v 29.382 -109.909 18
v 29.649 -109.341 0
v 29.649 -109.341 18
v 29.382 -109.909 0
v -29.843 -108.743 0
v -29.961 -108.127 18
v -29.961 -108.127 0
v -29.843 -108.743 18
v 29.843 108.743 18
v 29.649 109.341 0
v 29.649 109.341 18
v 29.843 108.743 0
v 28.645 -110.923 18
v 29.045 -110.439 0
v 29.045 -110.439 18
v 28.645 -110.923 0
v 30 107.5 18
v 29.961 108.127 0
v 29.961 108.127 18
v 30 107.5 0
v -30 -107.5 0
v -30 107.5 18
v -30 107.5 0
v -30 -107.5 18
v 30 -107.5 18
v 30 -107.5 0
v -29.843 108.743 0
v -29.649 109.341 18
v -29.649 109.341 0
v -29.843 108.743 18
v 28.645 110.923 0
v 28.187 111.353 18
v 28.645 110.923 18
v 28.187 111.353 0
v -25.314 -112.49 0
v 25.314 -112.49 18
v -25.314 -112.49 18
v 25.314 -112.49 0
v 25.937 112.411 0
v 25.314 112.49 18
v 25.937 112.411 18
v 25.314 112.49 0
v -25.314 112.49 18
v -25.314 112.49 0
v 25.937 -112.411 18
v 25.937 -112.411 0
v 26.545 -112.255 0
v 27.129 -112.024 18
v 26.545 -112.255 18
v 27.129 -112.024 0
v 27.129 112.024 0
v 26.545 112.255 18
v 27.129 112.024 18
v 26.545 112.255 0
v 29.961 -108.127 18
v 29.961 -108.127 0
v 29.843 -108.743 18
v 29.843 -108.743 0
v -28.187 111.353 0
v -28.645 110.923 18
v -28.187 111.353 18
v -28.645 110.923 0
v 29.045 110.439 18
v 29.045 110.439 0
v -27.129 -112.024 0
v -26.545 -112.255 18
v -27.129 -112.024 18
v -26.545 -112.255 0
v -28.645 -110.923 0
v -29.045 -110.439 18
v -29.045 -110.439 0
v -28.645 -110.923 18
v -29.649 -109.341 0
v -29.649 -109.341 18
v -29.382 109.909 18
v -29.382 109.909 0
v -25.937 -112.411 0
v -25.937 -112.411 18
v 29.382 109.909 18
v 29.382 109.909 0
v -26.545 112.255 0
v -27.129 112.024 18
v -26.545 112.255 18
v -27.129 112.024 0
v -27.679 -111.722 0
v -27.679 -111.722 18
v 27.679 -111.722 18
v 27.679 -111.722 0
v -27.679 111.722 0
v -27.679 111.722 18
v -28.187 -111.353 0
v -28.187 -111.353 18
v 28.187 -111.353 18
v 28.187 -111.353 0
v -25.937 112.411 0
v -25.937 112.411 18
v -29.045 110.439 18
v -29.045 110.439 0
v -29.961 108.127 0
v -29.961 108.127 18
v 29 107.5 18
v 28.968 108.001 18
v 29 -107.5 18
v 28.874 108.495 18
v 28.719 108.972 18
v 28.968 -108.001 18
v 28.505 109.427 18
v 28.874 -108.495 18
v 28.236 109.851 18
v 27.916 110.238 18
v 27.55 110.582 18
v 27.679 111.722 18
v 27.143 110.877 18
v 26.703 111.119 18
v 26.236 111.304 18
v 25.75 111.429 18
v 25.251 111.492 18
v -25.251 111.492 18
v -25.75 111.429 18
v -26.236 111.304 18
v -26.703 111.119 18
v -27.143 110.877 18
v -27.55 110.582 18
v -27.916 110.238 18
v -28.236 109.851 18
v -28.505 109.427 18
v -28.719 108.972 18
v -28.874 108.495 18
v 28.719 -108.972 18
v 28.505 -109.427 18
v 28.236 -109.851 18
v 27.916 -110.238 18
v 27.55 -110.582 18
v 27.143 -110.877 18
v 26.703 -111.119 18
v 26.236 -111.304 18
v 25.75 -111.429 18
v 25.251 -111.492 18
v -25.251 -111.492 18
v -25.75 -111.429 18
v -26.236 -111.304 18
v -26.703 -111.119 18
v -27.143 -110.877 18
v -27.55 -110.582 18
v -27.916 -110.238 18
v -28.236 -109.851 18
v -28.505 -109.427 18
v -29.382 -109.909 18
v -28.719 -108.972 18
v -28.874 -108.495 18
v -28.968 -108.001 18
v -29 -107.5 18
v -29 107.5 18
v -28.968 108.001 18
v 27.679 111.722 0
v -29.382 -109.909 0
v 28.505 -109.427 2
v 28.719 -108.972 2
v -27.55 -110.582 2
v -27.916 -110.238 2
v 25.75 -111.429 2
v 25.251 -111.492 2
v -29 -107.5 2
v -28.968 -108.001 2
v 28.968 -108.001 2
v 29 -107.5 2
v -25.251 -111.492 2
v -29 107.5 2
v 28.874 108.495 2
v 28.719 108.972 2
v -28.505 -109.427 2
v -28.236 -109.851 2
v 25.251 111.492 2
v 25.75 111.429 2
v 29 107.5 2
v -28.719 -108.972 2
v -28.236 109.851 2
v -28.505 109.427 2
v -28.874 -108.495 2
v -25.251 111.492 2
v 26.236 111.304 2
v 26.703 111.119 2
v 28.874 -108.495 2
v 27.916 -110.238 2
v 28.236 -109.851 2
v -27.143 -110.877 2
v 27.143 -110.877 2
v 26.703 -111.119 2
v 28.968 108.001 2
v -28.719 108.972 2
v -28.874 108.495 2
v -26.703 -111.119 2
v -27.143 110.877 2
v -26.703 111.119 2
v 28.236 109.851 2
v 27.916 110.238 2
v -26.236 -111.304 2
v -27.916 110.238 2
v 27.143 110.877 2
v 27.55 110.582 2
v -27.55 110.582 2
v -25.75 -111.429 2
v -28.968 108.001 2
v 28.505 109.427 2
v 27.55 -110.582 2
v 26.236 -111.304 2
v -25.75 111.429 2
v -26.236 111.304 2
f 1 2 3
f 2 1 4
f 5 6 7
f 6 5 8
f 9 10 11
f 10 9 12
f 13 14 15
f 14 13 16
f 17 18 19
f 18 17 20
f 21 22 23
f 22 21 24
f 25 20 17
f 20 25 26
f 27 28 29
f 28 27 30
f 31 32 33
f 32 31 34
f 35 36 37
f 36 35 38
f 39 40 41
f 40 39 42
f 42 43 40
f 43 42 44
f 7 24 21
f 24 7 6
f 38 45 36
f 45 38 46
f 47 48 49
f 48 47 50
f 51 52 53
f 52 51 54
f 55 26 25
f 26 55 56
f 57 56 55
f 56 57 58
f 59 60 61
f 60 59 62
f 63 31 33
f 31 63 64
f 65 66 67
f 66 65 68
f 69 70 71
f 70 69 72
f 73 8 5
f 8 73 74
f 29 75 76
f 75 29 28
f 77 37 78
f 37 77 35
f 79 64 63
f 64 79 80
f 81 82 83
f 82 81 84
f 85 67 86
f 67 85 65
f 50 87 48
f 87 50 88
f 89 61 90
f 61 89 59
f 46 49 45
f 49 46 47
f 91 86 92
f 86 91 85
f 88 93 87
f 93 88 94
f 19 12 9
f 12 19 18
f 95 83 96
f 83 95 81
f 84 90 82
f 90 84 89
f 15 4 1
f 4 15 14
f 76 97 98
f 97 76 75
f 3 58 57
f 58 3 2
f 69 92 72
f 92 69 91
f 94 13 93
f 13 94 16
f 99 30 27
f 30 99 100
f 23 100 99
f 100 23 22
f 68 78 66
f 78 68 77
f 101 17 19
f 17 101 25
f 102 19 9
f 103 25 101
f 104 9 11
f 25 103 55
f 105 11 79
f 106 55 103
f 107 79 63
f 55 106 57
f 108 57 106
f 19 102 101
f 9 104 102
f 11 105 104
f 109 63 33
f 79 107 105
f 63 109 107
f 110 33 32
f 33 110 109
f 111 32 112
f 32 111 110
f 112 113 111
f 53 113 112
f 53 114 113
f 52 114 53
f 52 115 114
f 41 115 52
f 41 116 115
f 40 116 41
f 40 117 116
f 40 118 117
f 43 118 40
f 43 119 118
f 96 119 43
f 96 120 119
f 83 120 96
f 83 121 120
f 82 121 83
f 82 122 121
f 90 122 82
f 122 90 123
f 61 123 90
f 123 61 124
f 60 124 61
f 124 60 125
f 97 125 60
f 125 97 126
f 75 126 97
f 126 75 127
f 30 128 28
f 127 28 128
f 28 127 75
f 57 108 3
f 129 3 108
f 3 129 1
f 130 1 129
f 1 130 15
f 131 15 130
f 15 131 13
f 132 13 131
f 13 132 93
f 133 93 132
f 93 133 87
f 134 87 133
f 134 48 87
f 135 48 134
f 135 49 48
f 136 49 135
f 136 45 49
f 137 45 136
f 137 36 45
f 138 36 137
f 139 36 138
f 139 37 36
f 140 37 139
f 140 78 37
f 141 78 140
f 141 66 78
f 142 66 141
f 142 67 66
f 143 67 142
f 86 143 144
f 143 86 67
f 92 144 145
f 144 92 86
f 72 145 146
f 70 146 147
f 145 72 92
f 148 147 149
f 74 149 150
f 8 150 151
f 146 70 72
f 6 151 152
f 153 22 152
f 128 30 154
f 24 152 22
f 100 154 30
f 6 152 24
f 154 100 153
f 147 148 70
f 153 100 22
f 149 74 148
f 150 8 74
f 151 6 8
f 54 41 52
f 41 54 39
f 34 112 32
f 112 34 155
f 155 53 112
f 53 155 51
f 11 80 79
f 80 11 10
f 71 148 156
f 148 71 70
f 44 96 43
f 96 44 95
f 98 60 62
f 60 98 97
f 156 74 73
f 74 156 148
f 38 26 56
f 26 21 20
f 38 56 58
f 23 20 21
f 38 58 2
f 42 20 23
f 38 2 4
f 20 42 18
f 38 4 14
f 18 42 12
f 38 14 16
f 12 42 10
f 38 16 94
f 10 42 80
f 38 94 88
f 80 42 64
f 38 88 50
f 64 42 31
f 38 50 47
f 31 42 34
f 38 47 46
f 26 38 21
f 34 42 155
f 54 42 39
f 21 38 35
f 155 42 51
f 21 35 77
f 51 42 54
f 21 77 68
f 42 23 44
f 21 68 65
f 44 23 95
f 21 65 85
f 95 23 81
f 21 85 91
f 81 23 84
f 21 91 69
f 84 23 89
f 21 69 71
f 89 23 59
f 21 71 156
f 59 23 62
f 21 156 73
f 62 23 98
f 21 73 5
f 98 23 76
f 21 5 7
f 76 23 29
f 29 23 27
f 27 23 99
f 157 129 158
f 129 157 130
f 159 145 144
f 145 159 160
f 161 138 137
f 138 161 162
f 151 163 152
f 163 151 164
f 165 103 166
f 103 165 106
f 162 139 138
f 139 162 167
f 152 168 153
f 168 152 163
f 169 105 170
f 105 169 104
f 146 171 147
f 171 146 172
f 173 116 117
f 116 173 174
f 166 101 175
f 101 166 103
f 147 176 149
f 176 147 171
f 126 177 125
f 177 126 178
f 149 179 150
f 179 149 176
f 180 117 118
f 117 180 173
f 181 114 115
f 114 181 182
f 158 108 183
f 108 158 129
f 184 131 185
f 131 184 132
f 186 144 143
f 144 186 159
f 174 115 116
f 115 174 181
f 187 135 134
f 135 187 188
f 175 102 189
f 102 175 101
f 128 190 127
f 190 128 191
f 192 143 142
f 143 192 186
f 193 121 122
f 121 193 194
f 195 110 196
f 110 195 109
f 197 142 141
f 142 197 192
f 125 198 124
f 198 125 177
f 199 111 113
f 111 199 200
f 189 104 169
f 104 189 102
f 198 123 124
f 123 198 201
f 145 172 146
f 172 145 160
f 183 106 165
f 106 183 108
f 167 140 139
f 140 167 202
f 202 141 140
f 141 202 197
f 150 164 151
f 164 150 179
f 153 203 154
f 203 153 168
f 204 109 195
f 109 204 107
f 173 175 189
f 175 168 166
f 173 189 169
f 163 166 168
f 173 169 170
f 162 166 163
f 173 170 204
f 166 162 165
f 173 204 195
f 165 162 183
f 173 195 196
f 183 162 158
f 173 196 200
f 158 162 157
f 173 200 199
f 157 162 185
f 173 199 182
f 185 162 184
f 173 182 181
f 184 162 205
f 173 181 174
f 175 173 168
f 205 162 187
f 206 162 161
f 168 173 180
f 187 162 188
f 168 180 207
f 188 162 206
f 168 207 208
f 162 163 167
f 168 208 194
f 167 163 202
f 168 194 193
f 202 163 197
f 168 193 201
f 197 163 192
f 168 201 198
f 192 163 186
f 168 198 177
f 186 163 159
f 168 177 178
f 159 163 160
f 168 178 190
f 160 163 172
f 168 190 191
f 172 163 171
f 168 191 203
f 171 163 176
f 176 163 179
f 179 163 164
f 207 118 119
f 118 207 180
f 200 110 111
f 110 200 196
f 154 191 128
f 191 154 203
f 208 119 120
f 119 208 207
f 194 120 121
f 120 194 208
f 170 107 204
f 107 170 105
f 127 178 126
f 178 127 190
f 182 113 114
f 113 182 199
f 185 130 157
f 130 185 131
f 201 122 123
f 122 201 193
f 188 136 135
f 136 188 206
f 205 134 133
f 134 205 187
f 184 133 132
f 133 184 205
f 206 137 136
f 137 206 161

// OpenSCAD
$fn = 50;


difference() {
	union() {
		hull() {
			translate(v = [-25.0000000000, 107.5000000000, 0]) {
				cylinder(h = 18, r = 5);
			}
			translate(v = [25.0000000000, 107.5000000000, 0]) {
				cylinder(h = 18, r = 5);
			}
			translate(v = [-25.0000000000, -107.5000000000, 0]) {
				cylinder(h = 18, r = 5);
			}
			translate(v = [25.0000000000, -107.5000000000, 0]) {
				cylinder(h = 18, r = 5);
			}
		}
	}
	union() {
		translate(v = [0, 0, 2]) {
			hull() {
				translate(v = [-25.0000000000, 107.5000000000, 0]) {
					cylinder(h = 16, r = 4);
				}
				translate(v = [25.0000000000, 107.5000000000, 0]) {
					cylinder(h = 16, r = 4);
				}
				translate(v = [-25.0000000000, -107.5000000000, 0]) {
					cylinder(h = 16, r = 4);
				}
				translate(v = [25.0000000000, -107.5000000000, 0]) {
					cylinder(h = 16, r = 4);
				}
			}
		}
	}
}
